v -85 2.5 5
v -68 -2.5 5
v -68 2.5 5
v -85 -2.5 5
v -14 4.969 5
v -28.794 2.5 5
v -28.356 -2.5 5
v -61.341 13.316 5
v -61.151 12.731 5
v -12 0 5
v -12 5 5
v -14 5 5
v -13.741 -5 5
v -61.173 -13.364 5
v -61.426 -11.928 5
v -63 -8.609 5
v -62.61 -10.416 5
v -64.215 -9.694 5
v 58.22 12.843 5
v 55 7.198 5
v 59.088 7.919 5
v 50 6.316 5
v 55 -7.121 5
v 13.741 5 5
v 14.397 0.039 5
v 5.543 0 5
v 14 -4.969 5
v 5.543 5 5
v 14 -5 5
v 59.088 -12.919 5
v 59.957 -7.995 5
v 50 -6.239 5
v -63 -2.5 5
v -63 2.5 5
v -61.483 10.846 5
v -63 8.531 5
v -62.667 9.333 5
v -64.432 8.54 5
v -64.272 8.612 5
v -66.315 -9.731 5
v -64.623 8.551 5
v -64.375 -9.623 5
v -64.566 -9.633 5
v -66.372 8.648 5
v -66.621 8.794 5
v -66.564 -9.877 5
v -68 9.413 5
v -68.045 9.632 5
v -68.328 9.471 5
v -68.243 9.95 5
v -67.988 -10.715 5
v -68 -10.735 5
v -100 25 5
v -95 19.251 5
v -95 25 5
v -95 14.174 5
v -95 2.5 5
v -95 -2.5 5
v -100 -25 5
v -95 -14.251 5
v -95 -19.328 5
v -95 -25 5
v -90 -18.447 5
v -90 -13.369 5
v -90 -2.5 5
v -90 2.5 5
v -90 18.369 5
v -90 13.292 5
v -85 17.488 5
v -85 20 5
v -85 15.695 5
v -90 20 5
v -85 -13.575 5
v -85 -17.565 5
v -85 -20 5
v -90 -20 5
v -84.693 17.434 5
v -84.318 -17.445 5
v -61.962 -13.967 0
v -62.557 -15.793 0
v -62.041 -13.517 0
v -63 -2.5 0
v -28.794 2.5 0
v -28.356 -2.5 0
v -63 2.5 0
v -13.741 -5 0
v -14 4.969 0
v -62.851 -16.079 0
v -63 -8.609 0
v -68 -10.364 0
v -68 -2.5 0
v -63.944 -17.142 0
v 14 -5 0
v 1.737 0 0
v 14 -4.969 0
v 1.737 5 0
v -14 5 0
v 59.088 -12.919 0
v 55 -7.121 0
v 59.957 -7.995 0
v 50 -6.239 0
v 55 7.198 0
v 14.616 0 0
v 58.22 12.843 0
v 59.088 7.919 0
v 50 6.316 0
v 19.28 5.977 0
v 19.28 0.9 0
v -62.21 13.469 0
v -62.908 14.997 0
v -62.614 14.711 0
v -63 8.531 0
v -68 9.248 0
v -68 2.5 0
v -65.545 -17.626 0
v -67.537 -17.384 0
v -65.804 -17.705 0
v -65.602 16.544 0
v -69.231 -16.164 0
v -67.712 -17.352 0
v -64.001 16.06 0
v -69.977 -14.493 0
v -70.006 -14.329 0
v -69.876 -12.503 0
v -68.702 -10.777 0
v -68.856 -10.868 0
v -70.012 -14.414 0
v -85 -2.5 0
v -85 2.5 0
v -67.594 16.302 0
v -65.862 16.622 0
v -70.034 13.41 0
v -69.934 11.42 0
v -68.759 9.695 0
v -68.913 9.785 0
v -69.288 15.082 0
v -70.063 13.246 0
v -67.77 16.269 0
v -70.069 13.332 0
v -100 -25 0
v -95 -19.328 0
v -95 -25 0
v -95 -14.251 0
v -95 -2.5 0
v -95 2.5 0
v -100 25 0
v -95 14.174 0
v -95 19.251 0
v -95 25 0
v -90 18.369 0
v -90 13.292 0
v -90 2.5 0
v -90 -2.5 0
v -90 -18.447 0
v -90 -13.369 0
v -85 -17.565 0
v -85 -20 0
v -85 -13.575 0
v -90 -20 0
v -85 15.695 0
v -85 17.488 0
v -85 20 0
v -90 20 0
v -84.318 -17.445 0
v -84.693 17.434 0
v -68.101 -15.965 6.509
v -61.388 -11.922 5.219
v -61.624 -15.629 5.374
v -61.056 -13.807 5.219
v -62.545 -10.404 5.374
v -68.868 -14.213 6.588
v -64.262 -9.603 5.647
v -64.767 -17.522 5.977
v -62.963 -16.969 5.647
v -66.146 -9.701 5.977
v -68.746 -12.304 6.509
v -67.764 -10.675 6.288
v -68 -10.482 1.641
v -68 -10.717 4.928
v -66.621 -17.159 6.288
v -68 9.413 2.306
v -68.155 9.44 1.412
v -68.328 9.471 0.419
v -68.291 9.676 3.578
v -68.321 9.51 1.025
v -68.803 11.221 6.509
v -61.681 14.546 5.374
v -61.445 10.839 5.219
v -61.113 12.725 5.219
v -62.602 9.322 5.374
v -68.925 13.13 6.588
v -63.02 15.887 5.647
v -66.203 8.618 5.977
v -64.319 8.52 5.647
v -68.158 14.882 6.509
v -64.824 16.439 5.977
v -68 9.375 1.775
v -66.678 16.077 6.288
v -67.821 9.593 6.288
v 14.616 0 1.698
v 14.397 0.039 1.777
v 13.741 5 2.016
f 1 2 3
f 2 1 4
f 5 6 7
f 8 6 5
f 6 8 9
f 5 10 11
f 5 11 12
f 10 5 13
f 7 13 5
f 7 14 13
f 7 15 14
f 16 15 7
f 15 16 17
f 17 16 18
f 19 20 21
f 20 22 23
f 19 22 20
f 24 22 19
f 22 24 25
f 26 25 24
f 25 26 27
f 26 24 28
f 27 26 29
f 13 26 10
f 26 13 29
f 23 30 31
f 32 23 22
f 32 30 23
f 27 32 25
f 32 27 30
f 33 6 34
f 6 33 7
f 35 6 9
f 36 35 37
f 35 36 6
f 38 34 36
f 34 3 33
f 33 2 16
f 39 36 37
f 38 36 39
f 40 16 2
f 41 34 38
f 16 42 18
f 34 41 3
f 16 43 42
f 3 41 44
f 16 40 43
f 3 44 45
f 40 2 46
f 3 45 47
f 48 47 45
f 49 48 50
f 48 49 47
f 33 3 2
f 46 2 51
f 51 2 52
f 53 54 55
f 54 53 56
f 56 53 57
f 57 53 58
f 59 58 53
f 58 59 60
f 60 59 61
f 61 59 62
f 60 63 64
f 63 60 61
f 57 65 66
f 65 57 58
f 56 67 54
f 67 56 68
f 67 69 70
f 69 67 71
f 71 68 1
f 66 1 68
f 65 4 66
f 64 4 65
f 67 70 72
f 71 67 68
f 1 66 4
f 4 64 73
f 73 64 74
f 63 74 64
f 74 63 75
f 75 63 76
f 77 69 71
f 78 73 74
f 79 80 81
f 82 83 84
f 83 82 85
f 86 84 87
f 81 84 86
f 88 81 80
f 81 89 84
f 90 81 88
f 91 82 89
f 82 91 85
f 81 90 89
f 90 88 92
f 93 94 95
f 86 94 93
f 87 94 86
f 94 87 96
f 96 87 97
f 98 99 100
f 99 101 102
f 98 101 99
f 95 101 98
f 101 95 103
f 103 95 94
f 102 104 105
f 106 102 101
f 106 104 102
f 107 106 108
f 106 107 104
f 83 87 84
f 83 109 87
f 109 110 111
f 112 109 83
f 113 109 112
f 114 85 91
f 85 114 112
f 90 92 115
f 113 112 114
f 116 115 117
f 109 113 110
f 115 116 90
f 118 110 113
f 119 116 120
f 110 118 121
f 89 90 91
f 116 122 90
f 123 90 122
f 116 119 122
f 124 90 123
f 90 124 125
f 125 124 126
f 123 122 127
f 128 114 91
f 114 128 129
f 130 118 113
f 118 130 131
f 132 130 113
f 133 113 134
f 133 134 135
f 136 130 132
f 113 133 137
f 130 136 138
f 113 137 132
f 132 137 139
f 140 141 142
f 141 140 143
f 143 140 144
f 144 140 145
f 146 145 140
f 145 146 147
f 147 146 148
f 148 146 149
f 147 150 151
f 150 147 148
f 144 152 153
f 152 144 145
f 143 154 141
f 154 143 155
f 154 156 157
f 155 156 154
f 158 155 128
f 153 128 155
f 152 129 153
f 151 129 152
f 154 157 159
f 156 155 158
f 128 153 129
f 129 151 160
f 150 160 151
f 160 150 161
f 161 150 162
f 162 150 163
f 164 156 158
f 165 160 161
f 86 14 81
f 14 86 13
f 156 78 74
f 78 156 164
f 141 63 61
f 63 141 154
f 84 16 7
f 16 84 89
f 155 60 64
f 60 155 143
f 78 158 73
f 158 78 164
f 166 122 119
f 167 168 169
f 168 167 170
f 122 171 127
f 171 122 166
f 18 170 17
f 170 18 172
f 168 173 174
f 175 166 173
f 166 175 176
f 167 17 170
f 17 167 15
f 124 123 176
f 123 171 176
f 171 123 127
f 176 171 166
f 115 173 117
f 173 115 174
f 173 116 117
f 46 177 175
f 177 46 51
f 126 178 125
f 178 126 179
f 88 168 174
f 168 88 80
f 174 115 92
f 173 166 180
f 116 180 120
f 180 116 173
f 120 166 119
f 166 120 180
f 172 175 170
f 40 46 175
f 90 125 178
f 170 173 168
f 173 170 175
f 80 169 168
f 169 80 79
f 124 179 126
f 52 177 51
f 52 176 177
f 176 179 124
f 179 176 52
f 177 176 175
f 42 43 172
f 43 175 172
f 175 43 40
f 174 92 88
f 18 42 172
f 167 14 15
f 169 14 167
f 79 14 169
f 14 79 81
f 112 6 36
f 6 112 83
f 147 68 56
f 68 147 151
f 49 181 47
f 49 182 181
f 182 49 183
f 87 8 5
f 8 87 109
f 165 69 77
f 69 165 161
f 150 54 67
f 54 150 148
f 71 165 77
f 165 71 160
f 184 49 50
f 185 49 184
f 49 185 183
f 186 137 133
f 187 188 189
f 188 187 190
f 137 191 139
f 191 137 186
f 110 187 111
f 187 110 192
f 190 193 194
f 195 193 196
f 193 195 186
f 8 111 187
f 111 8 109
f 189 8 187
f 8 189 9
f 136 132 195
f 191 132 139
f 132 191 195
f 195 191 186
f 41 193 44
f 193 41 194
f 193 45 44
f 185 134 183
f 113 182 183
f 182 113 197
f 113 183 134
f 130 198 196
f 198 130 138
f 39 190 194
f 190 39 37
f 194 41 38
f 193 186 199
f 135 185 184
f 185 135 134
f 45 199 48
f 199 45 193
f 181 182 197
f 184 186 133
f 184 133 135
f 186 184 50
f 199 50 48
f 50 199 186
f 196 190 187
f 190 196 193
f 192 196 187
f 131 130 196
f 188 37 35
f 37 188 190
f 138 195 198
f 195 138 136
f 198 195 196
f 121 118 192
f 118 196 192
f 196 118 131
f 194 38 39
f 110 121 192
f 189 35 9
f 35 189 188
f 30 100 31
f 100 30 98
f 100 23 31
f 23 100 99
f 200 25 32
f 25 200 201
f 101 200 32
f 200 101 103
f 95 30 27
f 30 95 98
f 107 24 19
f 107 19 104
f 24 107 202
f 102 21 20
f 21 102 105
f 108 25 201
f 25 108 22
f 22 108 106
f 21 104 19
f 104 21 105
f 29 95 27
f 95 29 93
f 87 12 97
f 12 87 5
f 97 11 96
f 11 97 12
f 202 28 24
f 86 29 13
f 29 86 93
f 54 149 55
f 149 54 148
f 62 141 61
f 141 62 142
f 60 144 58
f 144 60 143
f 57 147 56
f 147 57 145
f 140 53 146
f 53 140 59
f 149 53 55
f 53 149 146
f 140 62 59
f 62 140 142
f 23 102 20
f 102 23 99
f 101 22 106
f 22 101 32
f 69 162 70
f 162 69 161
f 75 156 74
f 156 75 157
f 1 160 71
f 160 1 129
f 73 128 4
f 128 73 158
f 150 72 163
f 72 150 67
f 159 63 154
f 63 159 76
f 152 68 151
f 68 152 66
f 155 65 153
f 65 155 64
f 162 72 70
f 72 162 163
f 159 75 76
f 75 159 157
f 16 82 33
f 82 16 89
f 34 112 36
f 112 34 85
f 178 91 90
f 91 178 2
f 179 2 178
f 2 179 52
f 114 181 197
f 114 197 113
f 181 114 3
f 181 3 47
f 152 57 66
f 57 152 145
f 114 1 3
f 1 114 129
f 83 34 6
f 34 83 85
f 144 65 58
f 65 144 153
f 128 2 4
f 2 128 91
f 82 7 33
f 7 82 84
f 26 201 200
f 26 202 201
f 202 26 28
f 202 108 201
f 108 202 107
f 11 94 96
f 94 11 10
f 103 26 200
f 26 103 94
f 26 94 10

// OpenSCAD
// Folding phone stand
//
//
//  Copyright 2011 John Cooper 
//
//  This program is free software: you can redistribute it and/or modify
//  it under the terms of the GNU General Public License as published by
//  the Free Software Foundation, either version 3 of the License, or
//   (at your option) any later version.
//
//  This program is distributed in the hope that it will be useful,
//  but WITHOUT ANY WARRANTY; without even the implied warranty of
//  MERCHANTABILITY or FITNESS FOR A PARTICULAR PURPOSE.  See the
//  GNU General Public License for more details.
//
//  You should have received a copy of the GNU General Public License
//  along with this program.  If not, see <http://www.gnu.org/licenses/>.


module arm () {
    difference () {
        union () {
            translate ([0, 2.5, 0]) {
                rotate ([0,0,-170]) {
                    difference () {
                        cube ([100,5,5]);
                        translate ([69,-1,-1]) {
                            cube ([17.5,7,7]);
                        }
                    }
                    translate ([68,4.5,-1]) {
                        rotate ([0,-10,0]) {
                            cylinder (h=7, r=4);
                        }
                    }
                }
                rotate ([0,0,170]) {
                    difference () {
                        cube ([100,5,5]);
                        translate ([68.5,-1,-1]) {
                            cube ([17.5,7,7]);
                        }
                    }
                    translate ([67,1.5,-1]) {
                        rotate ([0,-10,0]) {
                            cylinder (h=7, r=4);
                        }
                    }
                }
            }
            translate ([0, -2.5, 0]) {
                rotate ([0,0,-10]) {
                    cube ([60,5,5]);
                }
                rotate ([0,0,10]) {
                    cube ([60,5,5]);
                }
            }
            translate ([-14,-5,0]) {
                cube([28,10,5]);
            }
            translate ([-100,-25,0]) {
                cube ([5,50,5]);
            }
            translate ([50,-10,0]) {
                cube ([5,20,5]);
            }
            translate ([-90, -20, 0]) {
                cube ([5, 40, 5]);
            }
            translate ([-68, -15, 0]) {
                cube ([5, 28, 5]);
            }
            translate ([-100,-2.5,0]) {
                cube ([110,5,5]);
            }
        }
        translate ([-12,0,5]) {
            rotate ([0,20,0]) {
                cube ([40,8,6]);
            }
        }
        // Clean up the bottom of the panel
        translate ([-120,-50,-20]) {
            cube ( [200, 100, 20] );
        }
    }


}

arm();
rotate ([0,10,-5]) {
translate ([-84,-4,-20]) {
   % cube ( [13,300,100]);
}
}
